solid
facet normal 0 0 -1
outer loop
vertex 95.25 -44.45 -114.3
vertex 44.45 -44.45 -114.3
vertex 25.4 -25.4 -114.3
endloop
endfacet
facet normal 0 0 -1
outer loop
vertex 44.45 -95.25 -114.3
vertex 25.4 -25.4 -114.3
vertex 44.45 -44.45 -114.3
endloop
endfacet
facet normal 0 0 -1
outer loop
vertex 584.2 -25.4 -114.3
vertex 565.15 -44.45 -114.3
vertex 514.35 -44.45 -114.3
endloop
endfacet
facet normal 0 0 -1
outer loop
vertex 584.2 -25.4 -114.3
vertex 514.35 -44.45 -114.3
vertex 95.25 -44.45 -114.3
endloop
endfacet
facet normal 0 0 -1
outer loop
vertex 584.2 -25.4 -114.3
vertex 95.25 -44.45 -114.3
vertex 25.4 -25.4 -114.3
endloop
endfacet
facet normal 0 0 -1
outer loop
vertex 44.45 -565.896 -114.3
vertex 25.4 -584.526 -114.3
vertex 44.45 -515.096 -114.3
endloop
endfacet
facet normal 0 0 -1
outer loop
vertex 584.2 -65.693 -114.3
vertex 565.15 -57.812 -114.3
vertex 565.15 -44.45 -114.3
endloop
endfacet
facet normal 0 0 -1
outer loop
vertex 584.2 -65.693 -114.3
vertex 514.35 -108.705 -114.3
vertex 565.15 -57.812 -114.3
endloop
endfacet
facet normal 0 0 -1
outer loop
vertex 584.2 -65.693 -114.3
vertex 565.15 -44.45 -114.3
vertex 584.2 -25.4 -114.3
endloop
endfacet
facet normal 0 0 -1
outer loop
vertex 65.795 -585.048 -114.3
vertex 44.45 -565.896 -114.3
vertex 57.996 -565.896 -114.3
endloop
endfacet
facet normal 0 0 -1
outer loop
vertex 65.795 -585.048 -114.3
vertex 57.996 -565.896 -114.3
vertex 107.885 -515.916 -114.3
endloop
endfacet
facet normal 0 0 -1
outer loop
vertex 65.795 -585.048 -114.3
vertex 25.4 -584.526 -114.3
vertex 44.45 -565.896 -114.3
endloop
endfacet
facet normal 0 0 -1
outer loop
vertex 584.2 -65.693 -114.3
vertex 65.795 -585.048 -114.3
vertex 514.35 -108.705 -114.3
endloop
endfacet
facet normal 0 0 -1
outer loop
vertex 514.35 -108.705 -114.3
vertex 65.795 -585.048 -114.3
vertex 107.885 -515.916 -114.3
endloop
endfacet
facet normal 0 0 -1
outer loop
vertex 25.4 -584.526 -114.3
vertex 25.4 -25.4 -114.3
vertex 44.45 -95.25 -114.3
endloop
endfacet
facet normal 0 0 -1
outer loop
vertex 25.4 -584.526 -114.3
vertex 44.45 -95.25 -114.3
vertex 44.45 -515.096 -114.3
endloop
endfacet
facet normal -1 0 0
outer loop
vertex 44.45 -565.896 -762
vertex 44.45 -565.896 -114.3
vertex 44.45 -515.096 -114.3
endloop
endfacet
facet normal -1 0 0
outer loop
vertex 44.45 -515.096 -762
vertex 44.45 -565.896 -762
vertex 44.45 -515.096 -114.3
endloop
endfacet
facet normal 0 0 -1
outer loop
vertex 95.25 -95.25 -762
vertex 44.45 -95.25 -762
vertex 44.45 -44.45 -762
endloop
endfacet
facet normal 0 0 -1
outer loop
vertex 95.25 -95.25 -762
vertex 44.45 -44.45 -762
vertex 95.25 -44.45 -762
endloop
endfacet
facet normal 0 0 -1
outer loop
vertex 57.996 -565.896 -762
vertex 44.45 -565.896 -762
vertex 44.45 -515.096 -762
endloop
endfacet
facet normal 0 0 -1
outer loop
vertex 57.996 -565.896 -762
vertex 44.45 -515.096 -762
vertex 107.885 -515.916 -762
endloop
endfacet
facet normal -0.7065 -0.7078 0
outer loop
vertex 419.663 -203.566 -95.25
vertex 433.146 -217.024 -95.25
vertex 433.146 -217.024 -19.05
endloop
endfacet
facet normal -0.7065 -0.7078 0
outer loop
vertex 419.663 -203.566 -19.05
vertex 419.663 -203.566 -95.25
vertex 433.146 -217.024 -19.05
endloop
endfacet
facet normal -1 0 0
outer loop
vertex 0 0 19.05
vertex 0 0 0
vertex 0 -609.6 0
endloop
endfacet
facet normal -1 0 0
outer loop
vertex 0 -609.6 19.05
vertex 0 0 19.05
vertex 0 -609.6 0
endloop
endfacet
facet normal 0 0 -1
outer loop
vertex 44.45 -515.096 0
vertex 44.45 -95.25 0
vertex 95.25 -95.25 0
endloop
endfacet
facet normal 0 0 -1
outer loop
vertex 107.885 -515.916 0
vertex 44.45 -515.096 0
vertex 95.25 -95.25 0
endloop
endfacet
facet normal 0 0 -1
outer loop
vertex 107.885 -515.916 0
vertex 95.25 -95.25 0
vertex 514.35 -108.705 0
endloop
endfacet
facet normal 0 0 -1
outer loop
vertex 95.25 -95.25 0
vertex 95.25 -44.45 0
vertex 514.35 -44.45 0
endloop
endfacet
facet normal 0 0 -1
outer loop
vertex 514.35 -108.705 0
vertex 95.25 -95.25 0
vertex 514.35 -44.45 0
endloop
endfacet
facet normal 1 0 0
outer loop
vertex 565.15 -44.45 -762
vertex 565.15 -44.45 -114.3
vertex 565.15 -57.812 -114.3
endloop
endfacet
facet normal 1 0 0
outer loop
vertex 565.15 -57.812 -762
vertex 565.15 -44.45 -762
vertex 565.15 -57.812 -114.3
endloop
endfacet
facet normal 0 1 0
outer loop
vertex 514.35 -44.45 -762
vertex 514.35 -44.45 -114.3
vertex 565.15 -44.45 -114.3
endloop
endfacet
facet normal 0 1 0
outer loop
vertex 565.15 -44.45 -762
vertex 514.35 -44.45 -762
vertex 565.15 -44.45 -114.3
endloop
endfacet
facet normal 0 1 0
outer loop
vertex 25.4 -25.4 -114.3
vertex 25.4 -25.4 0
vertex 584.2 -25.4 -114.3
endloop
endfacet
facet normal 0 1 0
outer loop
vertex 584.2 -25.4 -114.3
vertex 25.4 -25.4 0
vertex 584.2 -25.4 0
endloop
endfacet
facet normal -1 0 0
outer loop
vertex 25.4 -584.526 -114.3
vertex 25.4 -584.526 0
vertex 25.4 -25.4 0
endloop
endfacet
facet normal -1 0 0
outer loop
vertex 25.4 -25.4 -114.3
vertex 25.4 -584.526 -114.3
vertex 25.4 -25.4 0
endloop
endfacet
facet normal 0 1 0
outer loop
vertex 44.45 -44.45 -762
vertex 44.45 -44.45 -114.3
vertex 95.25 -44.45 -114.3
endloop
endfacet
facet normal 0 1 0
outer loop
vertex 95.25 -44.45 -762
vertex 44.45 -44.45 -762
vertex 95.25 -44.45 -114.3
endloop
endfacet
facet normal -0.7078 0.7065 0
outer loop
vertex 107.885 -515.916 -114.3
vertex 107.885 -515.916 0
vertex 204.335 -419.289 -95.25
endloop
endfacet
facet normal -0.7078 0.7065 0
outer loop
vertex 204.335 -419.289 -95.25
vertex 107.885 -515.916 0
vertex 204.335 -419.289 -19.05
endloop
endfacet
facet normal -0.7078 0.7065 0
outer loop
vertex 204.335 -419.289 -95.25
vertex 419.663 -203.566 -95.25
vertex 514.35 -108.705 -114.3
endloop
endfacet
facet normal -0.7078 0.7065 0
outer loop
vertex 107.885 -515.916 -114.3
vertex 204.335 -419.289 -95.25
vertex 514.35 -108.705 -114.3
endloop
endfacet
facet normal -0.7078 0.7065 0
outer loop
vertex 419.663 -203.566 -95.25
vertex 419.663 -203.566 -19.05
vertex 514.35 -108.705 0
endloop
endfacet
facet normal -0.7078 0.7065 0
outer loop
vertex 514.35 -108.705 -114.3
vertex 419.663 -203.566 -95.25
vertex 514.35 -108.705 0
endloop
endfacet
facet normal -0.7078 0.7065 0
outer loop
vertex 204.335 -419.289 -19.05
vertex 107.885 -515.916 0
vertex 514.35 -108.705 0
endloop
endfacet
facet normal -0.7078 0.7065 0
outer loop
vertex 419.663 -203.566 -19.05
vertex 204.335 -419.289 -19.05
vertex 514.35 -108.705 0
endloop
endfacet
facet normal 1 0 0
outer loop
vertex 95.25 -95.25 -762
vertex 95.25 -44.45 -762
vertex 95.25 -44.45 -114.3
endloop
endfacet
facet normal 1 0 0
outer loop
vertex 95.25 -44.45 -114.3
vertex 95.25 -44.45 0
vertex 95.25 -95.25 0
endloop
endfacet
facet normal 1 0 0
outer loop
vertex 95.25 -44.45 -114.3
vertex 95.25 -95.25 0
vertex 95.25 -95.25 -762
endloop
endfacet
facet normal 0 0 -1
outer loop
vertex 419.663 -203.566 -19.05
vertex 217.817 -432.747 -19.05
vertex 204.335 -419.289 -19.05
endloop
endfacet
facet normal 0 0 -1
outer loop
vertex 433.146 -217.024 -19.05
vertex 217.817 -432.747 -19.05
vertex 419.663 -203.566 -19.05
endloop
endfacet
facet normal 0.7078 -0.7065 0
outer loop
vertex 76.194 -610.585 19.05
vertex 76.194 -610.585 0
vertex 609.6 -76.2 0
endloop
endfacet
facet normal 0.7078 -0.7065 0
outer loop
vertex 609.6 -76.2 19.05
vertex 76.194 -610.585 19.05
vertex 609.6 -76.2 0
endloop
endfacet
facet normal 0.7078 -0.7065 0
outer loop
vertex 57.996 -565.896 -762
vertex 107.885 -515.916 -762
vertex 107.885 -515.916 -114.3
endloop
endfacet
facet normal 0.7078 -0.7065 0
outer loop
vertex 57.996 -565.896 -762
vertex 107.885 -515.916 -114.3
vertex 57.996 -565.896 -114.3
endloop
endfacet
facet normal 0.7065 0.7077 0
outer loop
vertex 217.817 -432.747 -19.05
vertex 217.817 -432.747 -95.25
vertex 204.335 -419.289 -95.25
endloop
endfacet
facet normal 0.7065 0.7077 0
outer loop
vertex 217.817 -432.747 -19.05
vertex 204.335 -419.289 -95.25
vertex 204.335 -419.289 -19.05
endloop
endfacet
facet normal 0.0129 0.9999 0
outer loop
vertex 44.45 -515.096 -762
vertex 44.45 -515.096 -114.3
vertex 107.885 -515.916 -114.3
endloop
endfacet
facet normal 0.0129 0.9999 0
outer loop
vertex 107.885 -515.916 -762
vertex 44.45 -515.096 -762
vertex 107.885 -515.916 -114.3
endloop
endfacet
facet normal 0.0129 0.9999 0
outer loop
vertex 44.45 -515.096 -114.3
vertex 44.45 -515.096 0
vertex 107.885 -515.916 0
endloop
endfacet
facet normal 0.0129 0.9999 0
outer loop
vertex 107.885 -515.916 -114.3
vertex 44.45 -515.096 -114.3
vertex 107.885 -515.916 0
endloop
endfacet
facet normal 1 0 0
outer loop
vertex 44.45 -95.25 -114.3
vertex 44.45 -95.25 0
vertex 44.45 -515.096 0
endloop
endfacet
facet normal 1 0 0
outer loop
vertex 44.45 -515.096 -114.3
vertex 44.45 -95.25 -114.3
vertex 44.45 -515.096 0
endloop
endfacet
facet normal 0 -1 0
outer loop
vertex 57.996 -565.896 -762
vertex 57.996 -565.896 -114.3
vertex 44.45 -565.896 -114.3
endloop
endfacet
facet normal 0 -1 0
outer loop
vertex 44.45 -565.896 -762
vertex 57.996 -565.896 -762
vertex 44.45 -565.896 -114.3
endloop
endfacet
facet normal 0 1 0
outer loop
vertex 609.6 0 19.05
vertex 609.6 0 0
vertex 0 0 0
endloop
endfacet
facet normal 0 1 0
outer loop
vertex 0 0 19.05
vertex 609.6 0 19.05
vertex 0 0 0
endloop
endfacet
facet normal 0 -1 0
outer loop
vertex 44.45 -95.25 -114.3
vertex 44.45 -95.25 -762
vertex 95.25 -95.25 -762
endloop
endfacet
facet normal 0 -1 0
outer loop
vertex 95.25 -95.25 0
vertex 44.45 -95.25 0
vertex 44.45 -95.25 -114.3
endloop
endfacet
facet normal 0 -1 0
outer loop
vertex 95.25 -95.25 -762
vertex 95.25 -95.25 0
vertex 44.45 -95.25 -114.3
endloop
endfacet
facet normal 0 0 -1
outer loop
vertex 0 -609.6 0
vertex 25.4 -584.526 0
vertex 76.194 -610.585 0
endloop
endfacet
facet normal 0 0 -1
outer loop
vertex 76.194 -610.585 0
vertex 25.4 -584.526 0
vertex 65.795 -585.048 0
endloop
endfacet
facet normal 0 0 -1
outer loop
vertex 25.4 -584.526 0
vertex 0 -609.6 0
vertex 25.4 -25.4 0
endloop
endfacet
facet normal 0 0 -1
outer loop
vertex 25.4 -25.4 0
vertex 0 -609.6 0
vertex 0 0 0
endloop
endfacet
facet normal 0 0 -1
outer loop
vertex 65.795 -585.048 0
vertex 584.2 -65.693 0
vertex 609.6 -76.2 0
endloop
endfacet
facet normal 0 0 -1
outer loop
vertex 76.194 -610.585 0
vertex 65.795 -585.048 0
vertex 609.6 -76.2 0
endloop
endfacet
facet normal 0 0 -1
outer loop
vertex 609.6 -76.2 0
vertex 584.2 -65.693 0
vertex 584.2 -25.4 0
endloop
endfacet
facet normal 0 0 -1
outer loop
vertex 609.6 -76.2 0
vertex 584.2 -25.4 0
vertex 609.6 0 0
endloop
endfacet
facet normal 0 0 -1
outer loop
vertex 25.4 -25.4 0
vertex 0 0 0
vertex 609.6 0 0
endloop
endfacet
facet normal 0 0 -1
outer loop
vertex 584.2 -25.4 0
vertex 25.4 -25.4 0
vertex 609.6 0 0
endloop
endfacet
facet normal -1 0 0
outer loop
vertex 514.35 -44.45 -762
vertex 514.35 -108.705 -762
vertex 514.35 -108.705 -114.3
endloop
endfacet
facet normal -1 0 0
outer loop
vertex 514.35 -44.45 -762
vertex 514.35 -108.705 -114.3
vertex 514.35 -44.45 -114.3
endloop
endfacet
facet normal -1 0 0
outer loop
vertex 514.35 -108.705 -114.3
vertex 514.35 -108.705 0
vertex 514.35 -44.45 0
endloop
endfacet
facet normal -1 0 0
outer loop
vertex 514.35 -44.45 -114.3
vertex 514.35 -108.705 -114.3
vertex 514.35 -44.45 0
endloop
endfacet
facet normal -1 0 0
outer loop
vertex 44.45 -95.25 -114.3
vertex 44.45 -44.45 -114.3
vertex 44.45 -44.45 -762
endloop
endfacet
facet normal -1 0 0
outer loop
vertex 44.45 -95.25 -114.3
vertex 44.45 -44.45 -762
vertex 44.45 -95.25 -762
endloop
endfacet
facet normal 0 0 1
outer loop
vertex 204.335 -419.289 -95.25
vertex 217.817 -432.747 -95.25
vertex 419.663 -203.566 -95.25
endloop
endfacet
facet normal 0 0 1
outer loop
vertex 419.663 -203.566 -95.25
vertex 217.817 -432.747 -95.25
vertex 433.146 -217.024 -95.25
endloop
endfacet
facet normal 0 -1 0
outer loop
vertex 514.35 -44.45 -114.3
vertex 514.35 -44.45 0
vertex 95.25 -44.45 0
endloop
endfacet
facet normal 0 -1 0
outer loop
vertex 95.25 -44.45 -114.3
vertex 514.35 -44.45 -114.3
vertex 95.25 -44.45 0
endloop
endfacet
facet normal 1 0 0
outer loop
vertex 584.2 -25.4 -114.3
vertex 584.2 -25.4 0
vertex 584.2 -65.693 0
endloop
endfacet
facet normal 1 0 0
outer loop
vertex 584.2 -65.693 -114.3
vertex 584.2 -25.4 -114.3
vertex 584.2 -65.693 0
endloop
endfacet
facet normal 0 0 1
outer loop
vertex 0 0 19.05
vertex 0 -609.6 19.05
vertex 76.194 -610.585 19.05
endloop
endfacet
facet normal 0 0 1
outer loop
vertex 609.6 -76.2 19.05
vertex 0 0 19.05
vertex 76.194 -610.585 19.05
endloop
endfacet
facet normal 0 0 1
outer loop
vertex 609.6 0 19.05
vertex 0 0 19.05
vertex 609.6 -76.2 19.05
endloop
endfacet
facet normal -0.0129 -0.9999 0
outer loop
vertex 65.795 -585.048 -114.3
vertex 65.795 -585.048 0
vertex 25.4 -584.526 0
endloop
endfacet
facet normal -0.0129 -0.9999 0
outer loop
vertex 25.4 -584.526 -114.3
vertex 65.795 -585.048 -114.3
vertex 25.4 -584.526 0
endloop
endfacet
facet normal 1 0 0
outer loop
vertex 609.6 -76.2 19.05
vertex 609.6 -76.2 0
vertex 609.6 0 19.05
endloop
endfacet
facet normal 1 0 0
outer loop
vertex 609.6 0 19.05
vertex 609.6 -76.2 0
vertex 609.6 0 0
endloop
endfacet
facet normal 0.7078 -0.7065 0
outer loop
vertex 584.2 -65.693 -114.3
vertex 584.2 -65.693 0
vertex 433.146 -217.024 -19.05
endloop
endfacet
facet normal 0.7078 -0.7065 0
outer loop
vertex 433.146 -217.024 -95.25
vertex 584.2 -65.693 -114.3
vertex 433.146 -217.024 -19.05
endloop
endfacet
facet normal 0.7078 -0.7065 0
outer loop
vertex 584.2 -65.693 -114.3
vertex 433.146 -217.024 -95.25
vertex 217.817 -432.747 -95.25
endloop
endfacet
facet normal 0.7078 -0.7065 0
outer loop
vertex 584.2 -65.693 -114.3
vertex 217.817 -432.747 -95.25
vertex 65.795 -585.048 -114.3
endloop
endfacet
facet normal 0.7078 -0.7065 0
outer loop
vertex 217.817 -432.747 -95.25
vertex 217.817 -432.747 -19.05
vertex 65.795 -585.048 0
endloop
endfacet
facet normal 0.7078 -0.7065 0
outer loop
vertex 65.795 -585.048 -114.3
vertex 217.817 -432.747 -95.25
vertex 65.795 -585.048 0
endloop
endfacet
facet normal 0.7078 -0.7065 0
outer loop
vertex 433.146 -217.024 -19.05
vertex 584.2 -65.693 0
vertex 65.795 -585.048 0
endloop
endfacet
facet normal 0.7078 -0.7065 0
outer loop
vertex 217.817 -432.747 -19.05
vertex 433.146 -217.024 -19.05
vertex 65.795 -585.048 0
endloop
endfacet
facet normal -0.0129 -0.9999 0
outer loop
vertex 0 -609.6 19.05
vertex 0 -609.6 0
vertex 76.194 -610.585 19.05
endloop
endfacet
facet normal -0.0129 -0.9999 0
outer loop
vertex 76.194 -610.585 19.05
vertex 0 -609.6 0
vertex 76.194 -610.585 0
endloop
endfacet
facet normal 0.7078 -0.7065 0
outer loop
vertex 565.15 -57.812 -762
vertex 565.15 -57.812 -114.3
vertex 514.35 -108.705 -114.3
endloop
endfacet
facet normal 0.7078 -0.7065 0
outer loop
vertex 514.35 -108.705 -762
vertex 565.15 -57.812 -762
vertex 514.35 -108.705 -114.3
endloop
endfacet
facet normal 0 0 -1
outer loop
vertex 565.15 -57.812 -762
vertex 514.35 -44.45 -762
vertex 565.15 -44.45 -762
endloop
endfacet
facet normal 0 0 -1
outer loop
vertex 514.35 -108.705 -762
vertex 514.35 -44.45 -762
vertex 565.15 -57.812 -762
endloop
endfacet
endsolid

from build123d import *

# Parameters (mm, degrees)
F1_DEPTH  = 19.05
F4_DEPTH  = 114.3
F5_W      = 304.8
F5_H      = 76.2
F6_DEPTH  = 205.103861168
F8_DEPTH  = 762
F10_DEPTH = 762
F11_W     = 50.8
F11_H     = 50.8
F12_DEPTH = 762


with BuildPart() as f1:
    # F0 (on Top) → F1 (new body)
    with BuildSketch(Plane.XY):
        Polygon((609.6, 0), (0, 0), (0, -609.6), (76.1936366749, -610.5847488248), (609.6, -76.2), align=None)
    extrude(amount=F1_DEPTH)

    # F3 (on face) → F4 (join)
    with BuildSketch(Plane(origin=(0, 0, 0), x_dir=(1, 0, 0), z_dir=(0, 0, -1))):
        Polygon((584.2, 65.6926060926), (65.7952397089, 585.0482356184), (25.4, 584.5261557366), (25.4, 25.4), (584.2, 25.4), align=None)
        Polygon((44.45, 44.45), (44.45, 565.720772539), (57.9964419843, 565.8958507136), (565.15, 57.8120606621), (565.15, 44.45), align=None, mode=Mode.SUBTRACT)
    extrude(amount=F4_DEPTH)

    # F5 (on face) → F6 (cut)
    with BuildSketch(Plane(origin=(325.4815326726, -324.8856204339, 0), x_dir=(0.7064585835, 0.7077543852, 0), z_dir=(0.7077543852, -0.7064585835, 0))):
        with Locations((0, -57.15)):
            Rectangle(F5_W, F5_H)
    extrude(amount=-F6_DEPTH, mode=Mode.SUBTRACT)

    # F7 (on face) → F8 (join)
    with BuildSketch(Plane(origin=(0, 0, 0), x_dir=(1, 0, 0), z_dir=(0, 0, -1))):
        Polygon((57.9964419843, 565.8958507136), (44.45, 565.8958507136), (44.45, 515.0958507136), (107.8850816302, 515.9157042449), align=None)
    extrude(amount=F8_DEPTH)

    # F9 (on face) → F10 (join)
    with BuildSketch(Plane(origin=(0, 0, 0), x_dir=(1, 0, 0), z_dir=(0, 0, -1))):
        Polygon((565.15, 44.45), (565.15, 57.8120606621), (514.35, 108.7052391219), (514.35, 44.45), align=None)
    extrude(amount=F10_DEPTH)

    # F11 (on face) → F12 (join)
    with BuildSketch(Plane(origin=(0, 0, 0), x_dir=(1, 0, 0), z_dir=(0, 0, -1))):
        with Locations((69.85, 69.85)):
            Rectangle(F11_W, F11_H)
    extrude(amount=F12_DEPTH)


solid = f1.part
